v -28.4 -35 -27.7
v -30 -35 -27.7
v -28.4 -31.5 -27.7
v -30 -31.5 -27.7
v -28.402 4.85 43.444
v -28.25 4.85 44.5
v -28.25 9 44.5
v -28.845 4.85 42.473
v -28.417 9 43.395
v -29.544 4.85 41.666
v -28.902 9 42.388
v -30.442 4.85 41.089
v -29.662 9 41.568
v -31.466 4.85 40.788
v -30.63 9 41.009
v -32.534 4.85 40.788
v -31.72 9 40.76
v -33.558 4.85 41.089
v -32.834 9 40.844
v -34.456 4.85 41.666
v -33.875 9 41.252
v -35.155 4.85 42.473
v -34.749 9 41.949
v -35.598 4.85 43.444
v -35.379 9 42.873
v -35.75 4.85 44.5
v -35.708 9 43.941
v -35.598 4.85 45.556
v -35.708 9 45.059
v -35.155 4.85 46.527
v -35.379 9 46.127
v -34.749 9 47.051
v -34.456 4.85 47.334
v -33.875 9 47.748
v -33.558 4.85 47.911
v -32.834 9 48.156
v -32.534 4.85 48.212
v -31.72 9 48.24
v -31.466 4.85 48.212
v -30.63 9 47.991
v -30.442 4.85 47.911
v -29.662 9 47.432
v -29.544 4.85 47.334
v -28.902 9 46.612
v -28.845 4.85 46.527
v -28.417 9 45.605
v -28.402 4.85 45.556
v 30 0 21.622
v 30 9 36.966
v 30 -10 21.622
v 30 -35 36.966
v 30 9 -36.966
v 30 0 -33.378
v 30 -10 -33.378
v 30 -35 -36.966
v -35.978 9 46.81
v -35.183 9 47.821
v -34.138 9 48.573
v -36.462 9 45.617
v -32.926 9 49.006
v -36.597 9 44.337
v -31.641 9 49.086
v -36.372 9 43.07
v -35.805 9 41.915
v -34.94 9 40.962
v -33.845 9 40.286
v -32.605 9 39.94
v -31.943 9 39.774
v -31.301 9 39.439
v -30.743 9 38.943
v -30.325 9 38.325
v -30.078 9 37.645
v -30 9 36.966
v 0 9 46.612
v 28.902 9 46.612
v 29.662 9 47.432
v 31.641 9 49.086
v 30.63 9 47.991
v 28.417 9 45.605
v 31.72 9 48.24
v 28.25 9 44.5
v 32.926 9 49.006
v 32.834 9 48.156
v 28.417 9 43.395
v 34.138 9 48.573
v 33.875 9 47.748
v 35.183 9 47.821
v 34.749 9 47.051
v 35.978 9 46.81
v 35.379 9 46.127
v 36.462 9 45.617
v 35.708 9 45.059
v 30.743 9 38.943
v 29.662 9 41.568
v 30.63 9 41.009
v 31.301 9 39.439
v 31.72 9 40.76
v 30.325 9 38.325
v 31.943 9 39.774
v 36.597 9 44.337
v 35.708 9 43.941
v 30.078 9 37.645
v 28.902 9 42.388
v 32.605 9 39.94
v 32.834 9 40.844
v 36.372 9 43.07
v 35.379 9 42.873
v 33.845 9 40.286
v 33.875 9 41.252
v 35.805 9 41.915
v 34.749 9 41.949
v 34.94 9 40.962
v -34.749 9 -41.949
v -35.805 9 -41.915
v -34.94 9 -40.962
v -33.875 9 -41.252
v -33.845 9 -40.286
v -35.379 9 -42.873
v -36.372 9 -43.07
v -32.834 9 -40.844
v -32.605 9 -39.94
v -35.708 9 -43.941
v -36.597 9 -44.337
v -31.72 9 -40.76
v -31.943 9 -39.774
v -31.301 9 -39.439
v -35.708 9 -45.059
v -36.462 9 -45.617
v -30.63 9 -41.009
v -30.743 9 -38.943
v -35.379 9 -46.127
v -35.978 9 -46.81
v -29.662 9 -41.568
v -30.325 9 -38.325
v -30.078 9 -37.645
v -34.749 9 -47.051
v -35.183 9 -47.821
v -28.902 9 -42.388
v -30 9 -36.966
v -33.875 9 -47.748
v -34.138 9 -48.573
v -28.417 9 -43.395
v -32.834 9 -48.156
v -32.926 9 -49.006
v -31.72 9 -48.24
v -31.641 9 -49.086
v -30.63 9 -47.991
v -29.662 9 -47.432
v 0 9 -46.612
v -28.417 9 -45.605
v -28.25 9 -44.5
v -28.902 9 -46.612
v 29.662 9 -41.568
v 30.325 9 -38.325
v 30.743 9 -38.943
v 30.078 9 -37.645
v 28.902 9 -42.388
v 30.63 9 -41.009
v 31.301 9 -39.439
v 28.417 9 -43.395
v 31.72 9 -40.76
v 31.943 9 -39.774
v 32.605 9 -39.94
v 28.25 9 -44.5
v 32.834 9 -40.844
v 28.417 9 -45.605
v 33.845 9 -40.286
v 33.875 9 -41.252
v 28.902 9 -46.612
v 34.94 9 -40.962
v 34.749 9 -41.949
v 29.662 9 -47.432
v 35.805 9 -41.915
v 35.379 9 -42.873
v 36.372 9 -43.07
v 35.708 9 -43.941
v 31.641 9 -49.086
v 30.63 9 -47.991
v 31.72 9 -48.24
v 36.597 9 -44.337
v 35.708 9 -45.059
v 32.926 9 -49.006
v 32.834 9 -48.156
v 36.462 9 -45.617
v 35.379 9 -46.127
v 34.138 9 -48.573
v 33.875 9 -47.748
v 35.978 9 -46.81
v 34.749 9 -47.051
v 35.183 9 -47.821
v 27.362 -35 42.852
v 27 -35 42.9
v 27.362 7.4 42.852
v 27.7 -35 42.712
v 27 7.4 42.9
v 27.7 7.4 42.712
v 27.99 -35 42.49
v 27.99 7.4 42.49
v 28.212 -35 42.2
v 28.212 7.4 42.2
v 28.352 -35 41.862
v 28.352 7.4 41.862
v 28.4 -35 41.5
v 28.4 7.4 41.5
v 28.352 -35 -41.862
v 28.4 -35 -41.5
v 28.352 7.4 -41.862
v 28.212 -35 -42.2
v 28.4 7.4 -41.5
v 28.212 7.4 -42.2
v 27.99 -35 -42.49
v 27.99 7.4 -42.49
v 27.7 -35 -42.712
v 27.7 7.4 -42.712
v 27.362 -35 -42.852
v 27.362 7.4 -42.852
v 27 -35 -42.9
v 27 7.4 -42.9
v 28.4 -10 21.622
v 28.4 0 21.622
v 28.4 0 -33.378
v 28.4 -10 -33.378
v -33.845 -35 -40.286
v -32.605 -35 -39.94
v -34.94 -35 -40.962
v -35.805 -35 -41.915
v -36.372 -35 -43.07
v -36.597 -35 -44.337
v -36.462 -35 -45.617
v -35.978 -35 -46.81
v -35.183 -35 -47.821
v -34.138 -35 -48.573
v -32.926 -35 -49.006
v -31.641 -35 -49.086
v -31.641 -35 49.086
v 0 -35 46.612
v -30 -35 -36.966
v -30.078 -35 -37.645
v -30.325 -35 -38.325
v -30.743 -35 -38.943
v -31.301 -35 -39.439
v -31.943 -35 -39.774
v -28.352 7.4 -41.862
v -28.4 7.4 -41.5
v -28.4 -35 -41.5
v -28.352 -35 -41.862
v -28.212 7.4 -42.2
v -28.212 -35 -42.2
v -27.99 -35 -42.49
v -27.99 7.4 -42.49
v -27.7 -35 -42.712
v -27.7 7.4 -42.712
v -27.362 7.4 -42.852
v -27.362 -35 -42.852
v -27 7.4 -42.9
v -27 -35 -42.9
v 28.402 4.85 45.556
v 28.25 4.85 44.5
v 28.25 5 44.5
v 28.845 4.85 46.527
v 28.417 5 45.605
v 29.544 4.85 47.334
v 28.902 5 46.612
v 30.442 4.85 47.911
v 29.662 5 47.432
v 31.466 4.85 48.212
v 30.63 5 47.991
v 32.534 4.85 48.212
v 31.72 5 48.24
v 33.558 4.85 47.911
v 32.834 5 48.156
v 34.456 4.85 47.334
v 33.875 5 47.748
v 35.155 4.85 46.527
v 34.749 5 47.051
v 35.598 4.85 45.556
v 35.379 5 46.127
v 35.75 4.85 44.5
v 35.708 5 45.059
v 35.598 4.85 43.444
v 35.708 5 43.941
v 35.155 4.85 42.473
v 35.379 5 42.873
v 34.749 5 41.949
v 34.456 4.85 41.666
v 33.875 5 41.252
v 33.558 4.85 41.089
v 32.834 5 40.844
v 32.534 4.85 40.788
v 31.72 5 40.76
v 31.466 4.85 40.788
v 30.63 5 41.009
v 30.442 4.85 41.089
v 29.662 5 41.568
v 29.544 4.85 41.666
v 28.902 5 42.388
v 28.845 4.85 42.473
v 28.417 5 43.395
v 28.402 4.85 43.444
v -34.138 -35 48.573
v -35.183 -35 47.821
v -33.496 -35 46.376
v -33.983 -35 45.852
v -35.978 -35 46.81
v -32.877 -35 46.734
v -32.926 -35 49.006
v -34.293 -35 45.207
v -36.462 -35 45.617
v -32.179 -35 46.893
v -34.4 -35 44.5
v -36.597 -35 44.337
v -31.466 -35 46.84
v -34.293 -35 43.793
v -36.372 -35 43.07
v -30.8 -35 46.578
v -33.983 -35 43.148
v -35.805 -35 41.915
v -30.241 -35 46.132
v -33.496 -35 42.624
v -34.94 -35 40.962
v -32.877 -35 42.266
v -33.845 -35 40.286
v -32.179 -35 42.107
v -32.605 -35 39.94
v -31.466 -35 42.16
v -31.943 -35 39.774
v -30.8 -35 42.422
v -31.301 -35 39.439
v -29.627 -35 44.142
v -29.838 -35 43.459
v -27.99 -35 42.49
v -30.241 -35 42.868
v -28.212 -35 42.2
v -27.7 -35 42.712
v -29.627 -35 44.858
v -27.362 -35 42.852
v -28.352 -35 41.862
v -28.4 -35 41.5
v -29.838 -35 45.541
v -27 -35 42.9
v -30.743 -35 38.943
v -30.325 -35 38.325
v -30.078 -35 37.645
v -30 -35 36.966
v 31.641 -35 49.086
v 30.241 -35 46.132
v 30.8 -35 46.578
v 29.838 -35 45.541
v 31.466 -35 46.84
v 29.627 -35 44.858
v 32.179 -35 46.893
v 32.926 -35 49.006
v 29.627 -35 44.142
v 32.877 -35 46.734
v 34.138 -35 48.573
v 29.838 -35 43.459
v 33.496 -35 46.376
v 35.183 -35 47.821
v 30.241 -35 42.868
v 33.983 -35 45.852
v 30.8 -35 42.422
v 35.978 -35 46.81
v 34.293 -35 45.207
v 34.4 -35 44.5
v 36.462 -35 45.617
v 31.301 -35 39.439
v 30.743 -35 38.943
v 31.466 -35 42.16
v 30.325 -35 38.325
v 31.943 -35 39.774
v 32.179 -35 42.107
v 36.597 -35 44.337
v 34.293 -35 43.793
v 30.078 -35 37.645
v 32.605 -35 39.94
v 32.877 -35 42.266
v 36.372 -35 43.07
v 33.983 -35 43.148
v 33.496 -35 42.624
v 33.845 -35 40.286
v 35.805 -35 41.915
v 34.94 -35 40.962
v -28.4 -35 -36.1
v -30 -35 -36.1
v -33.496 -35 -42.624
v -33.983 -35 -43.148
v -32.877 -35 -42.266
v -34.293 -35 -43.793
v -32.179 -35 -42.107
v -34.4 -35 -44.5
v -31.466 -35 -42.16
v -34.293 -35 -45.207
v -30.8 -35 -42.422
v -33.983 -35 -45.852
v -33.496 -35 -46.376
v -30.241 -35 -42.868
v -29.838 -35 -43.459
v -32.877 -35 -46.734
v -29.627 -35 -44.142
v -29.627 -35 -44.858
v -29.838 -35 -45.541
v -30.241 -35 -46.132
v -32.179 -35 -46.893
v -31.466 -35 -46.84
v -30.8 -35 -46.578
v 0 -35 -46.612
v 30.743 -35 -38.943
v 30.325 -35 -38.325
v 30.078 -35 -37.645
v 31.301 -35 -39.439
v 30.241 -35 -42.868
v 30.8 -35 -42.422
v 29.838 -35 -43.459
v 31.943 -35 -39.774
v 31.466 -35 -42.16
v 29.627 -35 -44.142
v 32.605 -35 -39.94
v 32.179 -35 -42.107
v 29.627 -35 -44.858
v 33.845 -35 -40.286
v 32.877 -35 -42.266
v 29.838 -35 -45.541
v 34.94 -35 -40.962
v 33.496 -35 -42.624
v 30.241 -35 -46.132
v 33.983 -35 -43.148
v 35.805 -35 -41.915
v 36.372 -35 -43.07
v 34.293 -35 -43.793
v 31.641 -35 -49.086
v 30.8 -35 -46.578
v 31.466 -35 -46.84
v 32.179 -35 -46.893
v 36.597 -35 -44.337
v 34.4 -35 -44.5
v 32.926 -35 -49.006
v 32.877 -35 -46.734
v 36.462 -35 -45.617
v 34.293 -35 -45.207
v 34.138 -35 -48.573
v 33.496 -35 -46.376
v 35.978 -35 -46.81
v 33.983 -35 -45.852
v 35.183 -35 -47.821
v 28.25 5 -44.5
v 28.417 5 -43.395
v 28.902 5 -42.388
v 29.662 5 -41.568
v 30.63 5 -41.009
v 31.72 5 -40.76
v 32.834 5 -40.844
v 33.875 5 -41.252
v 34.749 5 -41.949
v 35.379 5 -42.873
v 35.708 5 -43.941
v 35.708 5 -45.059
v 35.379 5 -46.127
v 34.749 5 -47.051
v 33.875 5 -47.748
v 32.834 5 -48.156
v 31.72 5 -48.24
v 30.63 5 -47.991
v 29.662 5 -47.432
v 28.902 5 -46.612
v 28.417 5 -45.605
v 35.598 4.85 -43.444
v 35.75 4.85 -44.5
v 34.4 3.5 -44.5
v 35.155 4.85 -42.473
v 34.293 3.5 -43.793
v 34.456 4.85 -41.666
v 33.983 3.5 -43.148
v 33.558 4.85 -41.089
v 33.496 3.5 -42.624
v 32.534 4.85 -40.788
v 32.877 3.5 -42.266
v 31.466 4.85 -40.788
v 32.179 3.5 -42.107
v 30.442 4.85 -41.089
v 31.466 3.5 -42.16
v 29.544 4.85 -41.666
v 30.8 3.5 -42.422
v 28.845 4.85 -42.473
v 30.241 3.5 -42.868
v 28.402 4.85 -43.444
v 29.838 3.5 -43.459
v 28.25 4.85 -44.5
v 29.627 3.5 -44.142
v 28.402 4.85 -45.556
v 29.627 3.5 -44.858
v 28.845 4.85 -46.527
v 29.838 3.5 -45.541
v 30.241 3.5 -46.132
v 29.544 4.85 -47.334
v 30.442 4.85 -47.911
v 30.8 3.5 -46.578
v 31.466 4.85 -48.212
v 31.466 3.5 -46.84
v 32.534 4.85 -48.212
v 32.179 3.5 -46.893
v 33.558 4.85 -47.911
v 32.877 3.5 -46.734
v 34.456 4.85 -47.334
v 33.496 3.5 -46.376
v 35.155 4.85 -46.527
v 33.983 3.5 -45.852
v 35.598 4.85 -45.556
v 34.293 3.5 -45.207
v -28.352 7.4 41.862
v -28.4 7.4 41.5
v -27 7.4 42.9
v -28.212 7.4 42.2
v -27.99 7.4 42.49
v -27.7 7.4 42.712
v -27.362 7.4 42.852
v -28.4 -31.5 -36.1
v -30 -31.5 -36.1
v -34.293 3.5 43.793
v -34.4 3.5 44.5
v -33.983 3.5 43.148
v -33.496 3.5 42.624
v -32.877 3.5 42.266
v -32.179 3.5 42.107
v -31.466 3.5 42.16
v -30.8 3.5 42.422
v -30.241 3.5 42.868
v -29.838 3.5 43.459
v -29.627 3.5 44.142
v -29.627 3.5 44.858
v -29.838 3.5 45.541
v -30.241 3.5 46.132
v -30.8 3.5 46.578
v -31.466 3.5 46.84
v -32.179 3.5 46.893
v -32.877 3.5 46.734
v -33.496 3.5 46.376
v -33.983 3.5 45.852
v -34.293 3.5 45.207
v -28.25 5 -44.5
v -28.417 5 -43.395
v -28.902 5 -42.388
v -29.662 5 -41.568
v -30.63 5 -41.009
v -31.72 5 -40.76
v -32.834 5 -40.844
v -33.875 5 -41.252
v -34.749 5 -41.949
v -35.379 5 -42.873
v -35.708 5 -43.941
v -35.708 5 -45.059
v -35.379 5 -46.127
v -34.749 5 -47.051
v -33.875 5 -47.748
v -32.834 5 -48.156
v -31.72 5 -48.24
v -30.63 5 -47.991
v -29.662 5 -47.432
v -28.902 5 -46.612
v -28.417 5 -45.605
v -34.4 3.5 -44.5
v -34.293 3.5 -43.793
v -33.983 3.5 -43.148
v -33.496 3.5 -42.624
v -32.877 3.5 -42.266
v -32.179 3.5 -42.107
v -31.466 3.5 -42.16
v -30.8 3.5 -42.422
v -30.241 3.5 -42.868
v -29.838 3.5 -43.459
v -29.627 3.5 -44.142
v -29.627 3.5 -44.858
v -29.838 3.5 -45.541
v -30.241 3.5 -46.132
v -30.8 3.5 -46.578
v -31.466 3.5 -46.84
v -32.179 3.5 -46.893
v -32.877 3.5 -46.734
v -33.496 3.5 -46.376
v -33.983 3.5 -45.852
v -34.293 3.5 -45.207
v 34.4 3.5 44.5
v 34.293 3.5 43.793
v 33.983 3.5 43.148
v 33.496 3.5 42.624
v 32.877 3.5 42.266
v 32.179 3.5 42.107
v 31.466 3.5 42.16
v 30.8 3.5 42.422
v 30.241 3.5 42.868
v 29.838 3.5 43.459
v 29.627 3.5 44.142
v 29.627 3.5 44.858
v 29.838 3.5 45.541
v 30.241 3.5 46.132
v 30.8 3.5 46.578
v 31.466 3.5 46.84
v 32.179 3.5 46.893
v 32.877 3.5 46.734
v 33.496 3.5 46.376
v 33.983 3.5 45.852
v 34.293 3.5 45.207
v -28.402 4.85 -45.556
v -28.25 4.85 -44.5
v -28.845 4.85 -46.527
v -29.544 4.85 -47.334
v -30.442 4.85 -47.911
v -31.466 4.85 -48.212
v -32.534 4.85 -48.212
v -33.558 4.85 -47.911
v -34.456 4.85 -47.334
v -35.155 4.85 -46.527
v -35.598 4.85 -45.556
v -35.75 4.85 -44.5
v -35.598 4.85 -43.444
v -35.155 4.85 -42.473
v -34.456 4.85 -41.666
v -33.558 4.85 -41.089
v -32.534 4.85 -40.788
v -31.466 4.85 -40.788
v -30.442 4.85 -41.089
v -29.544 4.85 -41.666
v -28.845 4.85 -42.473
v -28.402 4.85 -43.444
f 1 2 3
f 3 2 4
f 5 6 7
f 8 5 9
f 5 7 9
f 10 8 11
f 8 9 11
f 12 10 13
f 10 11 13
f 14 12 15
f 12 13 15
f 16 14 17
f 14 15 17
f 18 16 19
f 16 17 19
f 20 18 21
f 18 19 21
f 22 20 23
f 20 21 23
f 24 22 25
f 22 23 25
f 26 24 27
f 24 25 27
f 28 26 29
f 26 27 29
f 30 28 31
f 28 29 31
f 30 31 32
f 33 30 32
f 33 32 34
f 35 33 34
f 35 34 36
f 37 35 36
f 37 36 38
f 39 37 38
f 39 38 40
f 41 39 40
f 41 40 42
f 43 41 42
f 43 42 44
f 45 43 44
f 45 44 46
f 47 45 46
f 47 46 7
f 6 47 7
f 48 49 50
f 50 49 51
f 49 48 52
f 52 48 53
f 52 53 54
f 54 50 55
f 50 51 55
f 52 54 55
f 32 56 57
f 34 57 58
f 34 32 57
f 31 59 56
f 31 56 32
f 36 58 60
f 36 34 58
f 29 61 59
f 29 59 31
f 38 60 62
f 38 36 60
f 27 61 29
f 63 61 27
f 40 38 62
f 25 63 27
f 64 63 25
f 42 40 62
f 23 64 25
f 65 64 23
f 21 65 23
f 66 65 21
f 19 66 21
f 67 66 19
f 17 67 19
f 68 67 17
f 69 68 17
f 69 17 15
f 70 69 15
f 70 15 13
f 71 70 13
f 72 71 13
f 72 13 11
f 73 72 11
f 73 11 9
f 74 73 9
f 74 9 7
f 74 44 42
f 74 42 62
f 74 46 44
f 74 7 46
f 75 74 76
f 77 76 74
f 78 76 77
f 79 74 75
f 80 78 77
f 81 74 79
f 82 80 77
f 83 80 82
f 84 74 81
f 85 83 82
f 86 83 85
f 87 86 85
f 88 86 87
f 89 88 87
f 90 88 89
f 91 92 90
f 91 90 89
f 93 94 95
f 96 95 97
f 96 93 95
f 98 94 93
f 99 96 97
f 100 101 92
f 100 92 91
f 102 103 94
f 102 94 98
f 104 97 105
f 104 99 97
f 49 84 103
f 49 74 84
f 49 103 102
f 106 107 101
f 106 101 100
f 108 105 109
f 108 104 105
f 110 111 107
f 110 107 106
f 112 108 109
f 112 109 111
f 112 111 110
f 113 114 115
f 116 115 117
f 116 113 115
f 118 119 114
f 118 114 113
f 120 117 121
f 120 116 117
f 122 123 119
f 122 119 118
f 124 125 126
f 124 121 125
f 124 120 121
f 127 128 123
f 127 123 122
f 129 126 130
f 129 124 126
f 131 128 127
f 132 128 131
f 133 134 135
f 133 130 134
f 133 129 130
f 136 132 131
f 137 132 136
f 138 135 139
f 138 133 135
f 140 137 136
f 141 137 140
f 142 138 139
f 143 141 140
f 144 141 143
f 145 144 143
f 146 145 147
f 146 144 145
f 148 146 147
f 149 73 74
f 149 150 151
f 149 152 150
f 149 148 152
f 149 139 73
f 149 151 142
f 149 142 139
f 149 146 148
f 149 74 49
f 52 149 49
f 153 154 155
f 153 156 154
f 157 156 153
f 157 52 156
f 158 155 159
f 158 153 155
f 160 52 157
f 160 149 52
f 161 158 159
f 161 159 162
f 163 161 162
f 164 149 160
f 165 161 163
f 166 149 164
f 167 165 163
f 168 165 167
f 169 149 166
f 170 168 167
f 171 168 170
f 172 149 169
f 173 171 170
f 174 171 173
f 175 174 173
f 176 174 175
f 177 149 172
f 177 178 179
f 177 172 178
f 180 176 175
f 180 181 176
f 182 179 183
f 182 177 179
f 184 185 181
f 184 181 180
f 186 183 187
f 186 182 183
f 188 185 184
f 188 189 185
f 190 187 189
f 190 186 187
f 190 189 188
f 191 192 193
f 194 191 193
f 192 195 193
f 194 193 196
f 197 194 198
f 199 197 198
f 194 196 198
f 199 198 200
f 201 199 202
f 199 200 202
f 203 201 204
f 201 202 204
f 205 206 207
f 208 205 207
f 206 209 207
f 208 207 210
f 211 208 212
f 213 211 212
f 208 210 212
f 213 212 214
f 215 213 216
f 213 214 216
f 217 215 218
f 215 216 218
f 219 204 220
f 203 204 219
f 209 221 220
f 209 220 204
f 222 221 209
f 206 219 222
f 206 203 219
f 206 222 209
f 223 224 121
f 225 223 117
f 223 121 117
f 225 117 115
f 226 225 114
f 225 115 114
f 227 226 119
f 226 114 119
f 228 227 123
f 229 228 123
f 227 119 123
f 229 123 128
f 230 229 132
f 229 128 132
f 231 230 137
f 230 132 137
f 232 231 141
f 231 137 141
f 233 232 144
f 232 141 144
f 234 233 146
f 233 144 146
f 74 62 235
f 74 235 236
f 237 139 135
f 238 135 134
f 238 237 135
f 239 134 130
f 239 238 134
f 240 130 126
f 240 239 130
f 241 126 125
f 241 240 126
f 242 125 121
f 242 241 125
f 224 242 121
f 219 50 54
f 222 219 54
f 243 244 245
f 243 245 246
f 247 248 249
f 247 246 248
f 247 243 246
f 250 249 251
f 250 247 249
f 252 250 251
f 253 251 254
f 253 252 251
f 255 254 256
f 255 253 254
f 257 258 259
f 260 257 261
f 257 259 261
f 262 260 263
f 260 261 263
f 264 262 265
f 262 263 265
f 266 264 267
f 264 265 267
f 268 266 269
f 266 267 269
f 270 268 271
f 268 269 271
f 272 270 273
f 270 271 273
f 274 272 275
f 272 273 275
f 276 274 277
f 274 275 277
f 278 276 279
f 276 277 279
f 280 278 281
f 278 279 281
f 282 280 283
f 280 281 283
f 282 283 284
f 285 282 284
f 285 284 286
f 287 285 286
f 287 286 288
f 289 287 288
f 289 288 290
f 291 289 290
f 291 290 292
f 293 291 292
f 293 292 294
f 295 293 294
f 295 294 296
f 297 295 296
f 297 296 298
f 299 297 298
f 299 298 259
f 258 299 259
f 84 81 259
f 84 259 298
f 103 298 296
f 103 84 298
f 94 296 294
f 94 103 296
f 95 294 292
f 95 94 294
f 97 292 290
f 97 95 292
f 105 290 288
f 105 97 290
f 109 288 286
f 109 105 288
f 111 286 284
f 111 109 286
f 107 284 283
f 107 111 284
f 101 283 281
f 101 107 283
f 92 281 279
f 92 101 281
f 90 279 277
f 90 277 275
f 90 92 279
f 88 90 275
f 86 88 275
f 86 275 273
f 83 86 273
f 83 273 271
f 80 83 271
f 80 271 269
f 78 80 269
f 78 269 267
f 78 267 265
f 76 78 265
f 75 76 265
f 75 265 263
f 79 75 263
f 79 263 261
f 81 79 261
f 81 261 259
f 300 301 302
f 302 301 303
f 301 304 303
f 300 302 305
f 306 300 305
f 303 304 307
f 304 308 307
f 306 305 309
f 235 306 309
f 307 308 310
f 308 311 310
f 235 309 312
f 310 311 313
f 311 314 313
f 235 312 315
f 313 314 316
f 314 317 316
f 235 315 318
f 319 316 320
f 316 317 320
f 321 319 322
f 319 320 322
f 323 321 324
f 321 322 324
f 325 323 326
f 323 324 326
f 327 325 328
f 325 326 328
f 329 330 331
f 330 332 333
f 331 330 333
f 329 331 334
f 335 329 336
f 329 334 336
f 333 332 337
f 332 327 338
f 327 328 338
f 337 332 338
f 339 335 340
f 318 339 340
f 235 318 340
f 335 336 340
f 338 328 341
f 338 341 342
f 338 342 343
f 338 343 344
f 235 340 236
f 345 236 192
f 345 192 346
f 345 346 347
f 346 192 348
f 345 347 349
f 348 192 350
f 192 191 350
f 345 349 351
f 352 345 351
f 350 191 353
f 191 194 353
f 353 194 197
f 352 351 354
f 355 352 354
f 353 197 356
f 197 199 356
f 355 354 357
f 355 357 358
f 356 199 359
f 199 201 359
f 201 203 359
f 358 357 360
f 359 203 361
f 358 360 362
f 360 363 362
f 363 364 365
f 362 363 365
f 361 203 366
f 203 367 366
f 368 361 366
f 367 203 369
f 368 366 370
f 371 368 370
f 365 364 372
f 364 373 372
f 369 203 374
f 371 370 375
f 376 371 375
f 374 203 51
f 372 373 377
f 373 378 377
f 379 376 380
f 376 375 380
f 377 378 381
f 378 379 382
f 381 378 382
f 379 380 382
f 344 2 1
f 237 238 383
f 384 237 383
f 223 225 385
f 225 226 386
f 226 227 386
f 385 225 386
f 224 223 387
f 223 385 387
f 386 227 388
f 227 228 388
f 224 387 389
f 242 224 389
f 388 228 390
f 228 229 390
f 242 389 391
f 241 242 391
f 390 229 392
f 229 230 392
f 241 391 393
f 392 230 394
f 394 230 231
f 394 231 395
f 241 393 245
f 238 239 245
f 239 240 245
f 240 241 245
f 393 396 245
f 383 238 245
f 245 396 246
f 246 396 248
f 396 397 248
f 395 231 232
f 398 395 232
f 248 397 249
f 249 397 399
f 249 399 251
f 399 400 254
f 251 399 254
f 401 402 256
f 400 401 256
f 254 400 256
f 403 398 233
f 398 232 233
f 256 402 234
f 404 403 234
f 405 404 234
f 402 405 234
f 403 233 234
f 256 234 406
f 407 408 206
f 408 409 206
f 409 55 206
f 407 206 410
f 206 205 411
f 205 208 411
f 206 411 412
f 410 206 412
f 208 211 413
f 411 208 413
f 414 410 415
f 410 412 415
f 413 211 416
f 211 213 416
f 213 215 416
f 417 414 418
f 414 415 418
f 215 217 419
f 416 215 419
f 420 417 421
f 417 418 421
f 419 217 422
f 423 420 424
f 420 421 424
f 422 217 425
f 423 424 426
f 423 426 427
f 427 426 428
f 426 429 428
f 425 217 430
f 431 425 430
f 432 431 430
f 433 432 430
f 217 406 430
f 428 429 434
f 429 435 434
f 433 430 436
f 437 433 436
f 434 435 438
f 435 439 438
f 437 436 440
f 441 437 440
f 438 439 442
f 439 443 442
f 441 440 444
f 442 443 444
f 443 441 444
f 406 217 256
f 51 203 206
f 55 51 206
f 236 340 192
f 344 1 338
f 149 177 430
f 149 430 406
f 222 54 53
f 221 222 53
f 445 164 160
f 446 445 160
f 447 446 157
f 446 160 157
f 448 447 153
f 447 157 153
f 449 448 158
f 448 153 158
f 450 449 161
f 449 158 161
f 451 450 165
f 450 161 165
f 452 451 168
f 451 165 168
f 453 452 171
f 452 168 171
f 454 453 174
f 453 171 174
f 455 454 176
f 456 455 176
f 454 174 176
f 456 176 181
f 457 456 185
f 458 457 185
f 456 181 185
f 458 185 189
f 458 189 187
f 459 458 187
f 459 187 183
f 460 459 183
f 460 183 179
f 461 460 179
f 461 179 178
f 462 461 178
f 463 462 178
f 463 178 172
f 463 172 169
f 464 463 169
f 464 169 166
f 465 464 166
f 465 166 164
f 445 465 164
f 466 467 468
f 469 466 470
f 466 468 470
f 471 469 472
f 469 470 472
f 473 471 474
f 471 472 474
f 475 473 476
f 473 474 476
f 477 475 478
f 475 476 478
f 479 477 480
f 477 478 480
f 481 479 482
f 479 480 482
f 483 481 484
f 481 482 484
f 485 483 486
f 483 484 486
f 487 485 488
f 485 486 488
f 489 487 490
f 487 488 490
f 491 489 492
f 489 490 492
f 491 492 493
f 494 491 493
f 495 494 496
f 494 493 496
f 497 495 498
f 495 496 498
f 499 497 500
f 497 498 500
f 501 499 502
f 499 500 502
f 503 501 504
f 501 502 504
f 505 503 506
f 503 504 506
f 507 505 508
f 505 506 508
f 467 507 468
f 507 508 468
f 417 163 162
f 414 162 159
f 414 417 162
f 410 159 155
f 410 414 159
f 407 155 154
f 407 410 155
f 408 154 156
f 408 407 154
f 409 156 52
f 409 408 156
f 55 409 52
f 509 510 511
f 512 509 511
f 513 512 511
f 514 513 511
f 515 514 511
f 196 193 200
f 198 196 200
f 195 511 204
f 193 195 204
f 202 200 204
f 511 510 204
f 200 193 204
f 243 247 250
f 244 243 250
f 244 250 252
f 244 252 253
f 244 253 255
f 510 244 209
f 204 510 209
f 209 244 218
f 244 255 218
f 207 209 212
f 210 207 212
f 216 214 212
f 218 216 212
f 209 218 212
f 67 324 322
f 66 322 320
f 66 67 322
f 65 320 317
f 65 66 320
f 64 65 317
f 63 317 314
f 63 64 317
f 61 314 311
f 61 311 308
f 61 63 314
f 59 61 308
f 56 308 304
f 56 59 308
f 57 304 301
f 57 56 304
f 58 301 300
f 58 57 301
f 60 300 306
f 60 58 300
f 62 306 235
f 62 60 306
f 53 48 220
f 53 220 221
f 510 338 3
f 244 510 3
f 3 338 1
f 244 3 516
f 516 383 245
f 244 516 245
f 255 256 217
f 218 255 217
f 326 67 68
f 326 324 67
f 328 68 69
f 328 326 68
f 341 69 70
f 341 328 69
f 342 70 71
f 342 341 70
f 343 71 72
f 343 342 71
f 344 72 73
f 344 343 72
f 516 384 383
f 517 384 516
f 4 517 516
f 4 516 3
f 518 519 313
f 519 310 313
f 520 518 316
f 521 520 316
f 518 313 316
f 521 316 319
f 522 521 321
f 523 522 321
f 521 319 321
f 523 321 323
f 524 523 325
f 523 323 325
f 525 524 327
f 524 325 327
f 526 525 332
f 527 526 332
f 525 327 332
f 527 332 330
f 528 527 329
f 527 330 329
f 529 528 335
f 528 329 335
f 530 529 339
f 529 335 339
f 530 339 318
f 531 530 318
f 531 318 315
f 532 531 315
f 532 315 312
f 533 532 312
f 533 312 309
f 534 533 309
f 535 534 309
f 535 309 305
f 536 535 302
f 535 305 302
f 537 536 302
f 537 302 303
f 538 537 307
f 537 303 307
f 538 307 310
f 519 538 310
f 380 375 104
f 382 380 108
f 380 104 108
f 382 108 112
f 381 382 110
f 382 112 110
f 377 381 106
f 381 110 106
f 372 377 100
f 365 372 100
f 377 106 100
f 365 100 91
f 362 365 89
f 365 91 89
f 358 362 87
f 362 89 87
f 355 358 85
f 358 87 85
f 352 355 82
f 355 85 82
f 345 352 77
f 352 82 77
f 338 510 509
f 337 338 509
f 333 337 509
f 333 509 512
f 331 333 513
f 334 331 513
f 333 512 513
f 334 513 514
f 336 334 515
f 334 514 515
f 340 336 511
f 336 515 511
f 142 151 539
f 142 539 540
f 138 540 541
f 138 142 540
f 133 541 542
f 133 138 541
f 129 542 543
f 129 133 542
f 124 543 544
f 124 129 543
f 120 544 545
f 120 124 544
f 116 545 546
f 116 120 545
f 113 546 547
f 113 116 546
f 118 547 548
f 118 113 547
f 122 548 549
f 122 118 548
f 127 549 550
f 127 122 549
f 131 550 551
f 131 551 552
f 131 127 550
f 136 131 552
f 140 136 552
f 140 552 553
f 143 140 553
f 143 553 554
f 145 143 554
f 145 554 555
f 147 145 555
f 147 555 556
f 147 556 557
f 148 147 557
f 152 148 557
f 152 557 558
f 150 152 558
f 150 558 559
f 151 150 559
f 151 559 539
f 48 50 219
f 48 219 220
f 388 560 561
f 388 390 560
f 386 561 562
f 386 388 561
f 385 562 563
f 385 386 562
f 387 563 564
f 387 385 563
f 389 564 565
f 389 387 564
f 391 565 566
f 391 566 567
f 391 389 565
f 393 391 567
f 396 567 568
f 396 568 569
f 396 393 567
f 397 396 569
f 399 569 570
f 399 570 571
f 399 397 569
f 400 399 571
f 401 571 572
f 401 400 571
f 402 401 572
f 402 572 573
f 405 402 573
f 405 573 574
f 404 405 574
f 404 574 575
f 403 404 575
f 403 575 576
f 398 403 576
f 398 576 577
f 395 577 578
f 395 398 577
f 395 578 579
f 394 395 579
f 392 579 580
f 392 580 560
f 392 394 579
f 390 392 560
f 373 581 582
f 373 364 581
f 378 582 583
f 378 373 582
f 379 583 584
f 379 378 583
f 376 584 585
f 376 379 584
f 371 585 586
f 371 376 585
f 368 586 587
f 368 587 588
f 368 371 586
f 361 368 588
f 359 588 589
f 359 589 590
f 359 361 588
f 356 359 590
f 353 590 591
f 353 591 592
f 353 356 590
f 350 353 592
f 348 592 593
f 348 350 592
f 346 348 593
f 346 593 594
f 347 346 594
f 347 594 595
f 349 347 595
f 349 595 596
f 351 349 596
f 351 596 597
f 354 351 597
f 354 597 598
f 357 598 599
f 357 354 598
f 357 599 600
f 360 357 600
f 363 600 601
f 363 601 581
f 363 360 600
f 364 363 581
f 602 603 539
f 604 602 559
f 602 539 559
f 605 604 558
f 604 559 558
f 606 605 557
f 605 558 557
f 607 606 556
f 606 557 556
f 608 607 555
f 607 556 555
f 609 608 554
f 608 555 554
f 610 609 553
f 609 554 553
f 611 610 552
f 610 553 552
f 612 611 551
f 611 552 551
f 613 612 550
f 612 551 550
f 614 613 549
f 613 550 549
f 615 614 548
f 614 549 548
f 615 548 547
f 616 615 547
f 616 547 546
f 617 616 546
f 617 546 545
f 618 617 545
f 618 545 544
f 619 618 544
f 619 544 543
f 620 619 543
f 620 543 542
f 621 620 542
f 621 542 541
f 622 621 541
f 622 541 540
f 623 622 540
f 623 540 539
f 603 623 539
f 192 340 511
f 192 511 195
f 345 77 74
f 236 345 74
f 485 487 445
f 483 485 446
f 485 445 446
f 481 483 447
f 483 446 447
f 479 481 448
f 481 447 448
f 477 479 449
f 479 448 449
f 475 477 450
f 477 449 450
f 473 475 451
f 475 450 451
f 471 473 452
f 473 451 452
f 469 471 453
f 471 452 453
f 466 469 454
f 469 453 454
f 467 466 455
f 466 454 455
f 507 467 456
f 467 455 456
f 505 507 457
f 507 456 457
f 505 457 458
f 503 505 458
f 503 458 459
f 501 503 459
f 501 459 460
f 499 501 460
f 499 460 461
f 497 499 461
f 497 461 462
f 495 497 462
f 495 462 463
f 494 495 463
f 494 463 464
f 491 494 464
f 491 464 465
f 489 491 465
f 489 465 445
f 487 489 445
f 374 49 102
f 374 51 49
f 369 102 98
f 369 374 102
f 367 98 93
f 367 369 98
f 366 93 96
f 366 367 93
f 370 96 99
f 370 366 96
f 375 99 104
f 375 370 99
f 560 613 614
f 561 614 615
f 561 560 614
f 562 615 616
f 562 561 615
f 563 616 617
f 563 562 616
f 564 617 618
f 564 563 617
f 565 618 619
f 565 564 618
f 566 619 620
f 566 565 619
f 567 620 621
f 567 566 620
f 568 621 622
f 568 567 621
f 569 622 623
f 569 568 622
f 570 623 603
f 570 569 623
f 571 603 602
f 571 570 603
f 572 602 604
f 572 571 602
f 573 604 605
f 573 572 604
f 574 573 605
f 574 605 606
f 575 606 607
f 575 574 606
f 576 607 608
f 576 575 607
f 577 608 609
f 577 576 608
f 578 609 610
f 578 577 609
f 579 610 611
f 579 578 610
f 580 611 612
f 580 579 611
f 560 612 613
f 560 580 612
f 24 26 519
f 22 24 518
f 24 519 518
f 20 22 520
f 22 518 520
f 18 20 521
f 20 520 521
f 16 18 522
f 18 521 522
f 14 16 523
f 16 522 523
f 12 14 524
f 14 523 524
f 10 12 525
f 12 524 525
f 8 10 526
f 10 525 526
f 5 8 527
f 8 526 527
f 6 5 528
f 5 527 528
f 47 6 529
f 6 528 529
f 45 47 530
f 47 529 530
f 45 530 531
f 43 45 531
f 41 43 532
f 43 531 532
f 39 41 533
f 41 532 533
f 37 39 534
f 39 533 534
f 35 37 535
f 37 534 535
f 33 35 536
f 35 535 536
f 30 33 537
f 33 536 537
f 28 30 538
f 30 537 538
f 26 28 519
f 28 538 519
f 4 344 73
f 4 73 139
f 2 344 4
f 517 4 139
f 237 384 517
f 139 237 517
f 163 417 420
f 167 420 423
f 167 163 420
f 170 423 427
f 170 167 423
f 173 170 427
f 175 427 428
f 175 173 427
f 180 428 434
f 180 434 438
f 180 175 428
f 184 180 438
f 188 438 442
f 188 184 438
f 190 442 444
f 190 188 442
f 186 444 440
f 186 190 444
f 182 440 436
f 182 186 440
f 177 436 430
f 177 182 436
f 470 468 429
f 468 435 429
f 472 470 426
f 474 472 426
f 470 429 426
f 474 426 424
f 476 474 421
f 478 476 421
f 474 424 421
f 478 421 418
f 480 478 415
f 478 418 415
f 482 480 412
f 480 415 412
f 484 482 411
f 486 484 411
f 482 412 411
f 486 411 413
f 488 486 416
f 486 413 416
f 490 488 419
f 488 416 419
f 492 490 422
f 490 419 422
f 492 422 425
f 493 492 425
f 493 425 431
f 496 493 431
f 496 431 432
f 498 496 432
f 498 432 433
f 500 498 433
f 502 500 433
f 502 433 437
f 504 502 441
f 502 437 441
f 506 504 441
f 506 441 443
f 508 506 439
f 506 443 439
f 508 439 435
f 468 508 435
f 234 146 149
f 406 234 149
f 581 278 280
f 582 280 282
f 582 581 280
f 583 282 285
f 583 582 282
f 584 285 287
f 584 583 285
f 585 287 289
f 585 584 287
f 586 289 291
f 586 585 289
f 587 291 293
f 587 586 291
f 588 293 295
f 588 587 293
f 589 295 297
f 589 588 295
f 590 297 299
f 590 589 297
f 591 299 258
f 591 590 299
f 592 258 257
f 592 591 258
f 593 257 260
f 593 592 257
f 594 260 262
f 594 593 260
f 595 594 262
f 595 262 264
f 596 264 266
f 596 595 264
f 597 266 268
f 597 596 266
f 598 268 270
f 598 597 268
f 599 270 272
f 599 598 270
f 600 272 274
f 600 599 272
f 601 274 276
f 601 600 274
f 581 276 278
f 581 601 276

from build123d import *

# Parameters (mm, degrees)
BASE_DEPTH                               = 9
BASE_DEPTH_BACK                          = 35
SKETCH1_W                                = 60
SKETCH1_H                                = 89
OUTSIDE_OF_BASE_R                        = 3
INSIDE_OF_BASE_T                         = -1.6
TOP_START                                = -44
TOP_FASTENING_BODY_DEPTH                 = 44
CBORE_FOR_M4_SHCS1_D                     = 4.8
CBORE_FOR_M4_SHCS1_CBORE_D               = 7.5
CBORE_FOR_M4_SHCS1_CBORE_DEPTH           = 4
TFB_START                                = -44
TFB_M_V_COPY_1_DEPTH                     = 44
TFB_M_V_COPY_2_D                         = 4.8
TFB_M_V_COPY_2_CBORE_D                   = 7.5
TFB_M_V_COPY_2_CBORE_DEPTH               = 4
SKETCH12_W                               = 8.4
SKETCH12_H                               = 3.5
MICROUSB_DEPTH                           = 1.6
F_3D_PRINTING_FOR_FASTENING_FEATURE_SIZE = 1.5
TFB_OUTER_R                              = 3
SKETCH28_W                               = 55
SKETCH28_H                               = 10
CUT_EXTRUDE1_DEPTH                       = 10


with BuildPart() as part:
    # Sketch1 → BASE (new, two sides: drawn at the far end of the back side and taken through both)
    with BuildSketch(Plane(origin=(0, 0, 0), x_dir=(1, 0, 0), z_dir=(0, 1, 0)).offset(-BASE_DEPTH_BACK)):
        Rectangle(SKETCH1_W, SKETCH1_H)
    extrude(amount=BASE_DEPTH + BASE_DEPTH_BACK)

    # OUTSIDE OF BASE
    outside_of_base_edges = [part.edges().sort_by_distance(p)[0] for p in [
        (30, -13, 44.5),
        (-30, -13, 44.5),
        (-30, -13, -44.5),
        (30, -13, -44.5),
    ]]
    fillet(outside_of_base_edges, radius=OUTSIDE_OF_BASE_R)

    # INSIDE OF BASE
    inside_of_base_openings = [part.faces().sort_by_distance(p)[0] for p in [
        (0, -35, 0),
    ]]
    offset(amount=INSIDE_OF_BASE_T, openings=inside_of_base_openings, kind=Kind.INTERSECTION)

    # Sketch22 → TOP FASTENING BODY (add)
    with BuildSketch(Plane.XZ.offset(35).offset(TOP_START)):
        with BuildLine():
            Line((-31.641355932, 49.085997649), (27, 44.5))
            Line((27, 44.5), (-27, 44.5))
            ThreePointArc((-27, 44.5), (-29.121320344, 43.621320344), (-30, 41.5))
            Line((-30, 41.5), (-30, 39.729546587))
            Line((-30, 39.729546587), (-32.358644068, 39.914002351))
            ThreePointArc((-32.358644068, 39.914002351), (-36.585997649, 44.858644068), (-31.641355932, 49.085997649))
        make_face()
    top_fastening_body = extrude(amount=TOP_FASTENING_BODY_DEPTH)

    # CBORE for M4 SHCS1 (through all)
    with Locations(Plane(origin=(0, 9, 0), x_dir=(1, 0, 0), z_dir=(0, 1, 0))):
        with Locations((-32, -44.5)):
            cbore_for_m4_shcs1 = CounterBoreHole(CBORE_FOR_M4_SHCS1_D / 2, CBORE_FOR_M4_SHCS1_CBORE_D / 2, CBORE_FOR_M4_SHCS1_CBORE_DEPTH)

    # TFB M H: TOP FASTENING BODY, CBORE for M4 SHCS1 across plane
    add(top_fastening_body.mirror(Plane(origin=(0, 0, 0), x_dir=(0, 0, 1), z_dir=(1, 0, 0))))
    add(cbore_for_m4_shcs1.mirror(Plane(origin=(0, 0, 0), x_dir=(0, 0, 1), z_dir=(1, 0, 0))), mode=Mode.SUBTRACT)

    # TFB M V: TOP FASTENING BODY, CBORE for M4 SHCS1 across plane
    add(top_fastening_body.mirror(Plane.XY))
    add(cbore_for_m4_shcs1.mirror(Plane.XY), mode=Mode.SUBTRACT)

    # TFB M V copy 1 sketch → TFB M V copy 1 (add)
    with BuildSketch(Plane(origin=(0, -35, 0), x_dir=(-1, 0, 0), z_dir=(0, -1, 0)).offset(TFB_START)):
        with BuildLine():
            Line((-31.641355932, 49.085997649), (27, 44.5))
            Line((27, 44.5), (-27, 44.5))
            ThreePointArc((-27, 44.5), (-29.121320344, 43.621320344), (-30, 41.5))
            Line((-30, 41.5), (-30, 39.729546587))
            Line((-30, 39.729546587), (-32.358644068, 39.914002351))
            ThreePointArc((-32.358644068, 39.914002351), (-36.585997649, 44.858644068), (-31.641355932, 49.085997649))
        make_face()
    extrude(amount=TFB_M_V_COPY_1_DEPTH)

    # TFB M V copy 2 (through all)
    with Locations(Plane(origin=(0, 9, 0), x_dir=(-1, 0, 0), z_dir=(0, 1, 0))):
        with Locations((-32, -44.5)):
            CounterBoreHole(TFB_M_V_COPY_2_D / 2, TFB_M_V_COPY_2_CBORE_D / 2, TFB_M_V_COPY_2_CBORE_DEPTH)

    # Sketch12 → MICROUSB (cut)
    with BuildSketch(Plane.ZY.offset(30)):
        with Locations((-31.9, -33.25)):
            Rectangle(SKETCH12_W, SKETCH12_H)
    extrude(amount=-MICROUSB_DEPTH, mode=Mode.SUBTRACT)

    # 3D PRINTING FOR FASTENING FEATURE
    # the kernel refuses this chamfer: 1.5 mm, written as the material it takes off along each edge
    with BuildSketch(Plane(origin=(32, 5, 44.5), x_dir=(1, 0, 0), z_dir=(0, 0, 1))) as f_3d_printing_for_fastening_feature_piece_1_section:
        Polygon((2.4 + F_3D_PRINTING_FOR_FASTENING_FEATURE_SIZE, 0), (2.4, -F_3D_PRINTING_FOR_FASTENING_FEATURE_SIZE), (2.4, 0), align=None)
    f_3d_printing_for_fastening_feature_piece_1 = revolve(axis=Axis((32, 5, 44.5), (0, 1, 0)), mode=Mode.PRIVATE)
    f_3d_printing_for_fastening_feature_piece_1 = f_3d_printing_for_fastening_feature_piece_1 & Plane(origin=(32, 4.173590616, 44.5), x_dir=(-1, 0, 0), z_dir=(0, 1, 0)) * Cylinder(3.75, 16, mode=Mode.PRIVATE)
    add(f_3d_printing_for_fastening_feature_piece_1, mode=Mode.SUBTRACT)
    with BuildSketch(Plane(origin=(32, 5, -44.5), x_dir=(1, 0, 0), z_dir=(0, 0, -1))) as f_3d_printing_for_fastening_feature_piece_2_section:
        Polygon((2.4 + F_3D_PRINTING_FOR_FASTENING_FEATURE_SIZE, 0), (2.4, F_3D_PRINTING_FOR_FASTENING_FEATURE_SIZE), (2.4, 0), align=None)
    f_3d_printing_for_fastening_feature_piece_2 = revolve(axis=Axis((32, 5, -44.5), (0, -1, 0)), mode=Mode.PRIVATE)
    f_3d_printing_for_fastening_feature_piece_2 = f_3d_printing_for_fastening_feature_piece_2 & Plane(origin=(32, 4.173590616, -44.5), x_dir=(-1, 0, 0), z_dir=(0, 1, 0)) * Cylinder(3.75, 16, mode=Mode.PRIVATE)
    add(f_3d_printing_for_fastening_feature_piece_2, mode=Mode.SUBTRACT)
    with BuildSketch(Plane(origin=(-32, 5, -44.5), x_dir=(-1, 0, 0), z_dir=(0, 0, -1))) as f_3d_printing_for_fastening_feature_piece_3_section:
        Polygon((2.4 + F_3D_PRINTING_FOR_FASTENING_FEATURE_SIZE, 0), (2.4, -F_3D_PRINTING_FOR_FASTENING_FEATURE_SIZE), (2.4, 0), align=None)
    f_3d_printing_for_fastening_feature_piece_3 = revolve(axis=Axis((-32, 5, -44.5), (0, 1, 0)), mode=Mode.PRIVATE)
    f_3d_printing_for_fastening_feature_piece_3 = f_3d_printing_for_fastening_feature_piece_3 & Plane(origin=(-32, 4.173590616, -44.5), x_dir=(1, 0, 0), z_dir=(0, 1, 0)) * Cylinder(3.75, 16, mode=Mode.PRIVATE)
    add(f_3d_printing_for_fastening_feature_piece_3, mode=Mode.SUBTRACT)
    with BuildSketch(Plane(origin=(-32, 5, 44.5), x_dir=(-1, 0, 0), z_dir=(0, 0, 1))) as f_3d_printing_for_fastening_feature_piece_4_section:
        Polygon((2.4 + F_3D_PRINTING_FOR_FASTENING_FEATURE_SIZE, 0), (2.4, F_3D_PRINTING_FOR_FASTENING_FEATURE_SIZE), (2.4, 0), align=None)
    f_3d_printing_for_fastening_feature_piece_4 = revolve(axis=Axis((-32, 5, 44.5), (0, -1, 0)), mode=Mode.PRIVATE)
    f_3d_printing_for_fastening_feature_piece_4 = f_3d_printing_for_fastening_feature_piece_4 & Plane(origin=(-32, 4.173590616, 44.5), x_dir=(1, 0, 0), z_dir=(0, 1, 0)) * Cylinder(3.75, 16, mode=Mode.PRIVATE)
    add(f_3d_printing_for_fastening_feature_piece_4, mode=Mode.SUBTRACT)

    # TFB OUTER
    tfb_outer_edges = [part.edges().sort_by_distance(p)[0] for p in [
        (30, -13, 39.729546587),
        (30, -13, -39.729546587),
        (-30, -13, -39.729546587),
        (-30, -13, 39.729546587),
    ]]
    fillet(tfb_outer_edges, radius=TFB_OUTER_R)

    # Sketch28 → Cut-Extrude1 (cut)
    with BuildSketch(Plane(origin=(30, 0, 0), x_dir=(0, 0, -1), z_dir=(1, 0, 0))):
        with Locations((5.877935747, -5)):
            Rectangle(SKETCH28_W, SKETCH28_H)
    extrude(amount=-CUT_EXTRUDE1_DEPTH, mode=Mode.SUBTRACT)


solid = part.part
